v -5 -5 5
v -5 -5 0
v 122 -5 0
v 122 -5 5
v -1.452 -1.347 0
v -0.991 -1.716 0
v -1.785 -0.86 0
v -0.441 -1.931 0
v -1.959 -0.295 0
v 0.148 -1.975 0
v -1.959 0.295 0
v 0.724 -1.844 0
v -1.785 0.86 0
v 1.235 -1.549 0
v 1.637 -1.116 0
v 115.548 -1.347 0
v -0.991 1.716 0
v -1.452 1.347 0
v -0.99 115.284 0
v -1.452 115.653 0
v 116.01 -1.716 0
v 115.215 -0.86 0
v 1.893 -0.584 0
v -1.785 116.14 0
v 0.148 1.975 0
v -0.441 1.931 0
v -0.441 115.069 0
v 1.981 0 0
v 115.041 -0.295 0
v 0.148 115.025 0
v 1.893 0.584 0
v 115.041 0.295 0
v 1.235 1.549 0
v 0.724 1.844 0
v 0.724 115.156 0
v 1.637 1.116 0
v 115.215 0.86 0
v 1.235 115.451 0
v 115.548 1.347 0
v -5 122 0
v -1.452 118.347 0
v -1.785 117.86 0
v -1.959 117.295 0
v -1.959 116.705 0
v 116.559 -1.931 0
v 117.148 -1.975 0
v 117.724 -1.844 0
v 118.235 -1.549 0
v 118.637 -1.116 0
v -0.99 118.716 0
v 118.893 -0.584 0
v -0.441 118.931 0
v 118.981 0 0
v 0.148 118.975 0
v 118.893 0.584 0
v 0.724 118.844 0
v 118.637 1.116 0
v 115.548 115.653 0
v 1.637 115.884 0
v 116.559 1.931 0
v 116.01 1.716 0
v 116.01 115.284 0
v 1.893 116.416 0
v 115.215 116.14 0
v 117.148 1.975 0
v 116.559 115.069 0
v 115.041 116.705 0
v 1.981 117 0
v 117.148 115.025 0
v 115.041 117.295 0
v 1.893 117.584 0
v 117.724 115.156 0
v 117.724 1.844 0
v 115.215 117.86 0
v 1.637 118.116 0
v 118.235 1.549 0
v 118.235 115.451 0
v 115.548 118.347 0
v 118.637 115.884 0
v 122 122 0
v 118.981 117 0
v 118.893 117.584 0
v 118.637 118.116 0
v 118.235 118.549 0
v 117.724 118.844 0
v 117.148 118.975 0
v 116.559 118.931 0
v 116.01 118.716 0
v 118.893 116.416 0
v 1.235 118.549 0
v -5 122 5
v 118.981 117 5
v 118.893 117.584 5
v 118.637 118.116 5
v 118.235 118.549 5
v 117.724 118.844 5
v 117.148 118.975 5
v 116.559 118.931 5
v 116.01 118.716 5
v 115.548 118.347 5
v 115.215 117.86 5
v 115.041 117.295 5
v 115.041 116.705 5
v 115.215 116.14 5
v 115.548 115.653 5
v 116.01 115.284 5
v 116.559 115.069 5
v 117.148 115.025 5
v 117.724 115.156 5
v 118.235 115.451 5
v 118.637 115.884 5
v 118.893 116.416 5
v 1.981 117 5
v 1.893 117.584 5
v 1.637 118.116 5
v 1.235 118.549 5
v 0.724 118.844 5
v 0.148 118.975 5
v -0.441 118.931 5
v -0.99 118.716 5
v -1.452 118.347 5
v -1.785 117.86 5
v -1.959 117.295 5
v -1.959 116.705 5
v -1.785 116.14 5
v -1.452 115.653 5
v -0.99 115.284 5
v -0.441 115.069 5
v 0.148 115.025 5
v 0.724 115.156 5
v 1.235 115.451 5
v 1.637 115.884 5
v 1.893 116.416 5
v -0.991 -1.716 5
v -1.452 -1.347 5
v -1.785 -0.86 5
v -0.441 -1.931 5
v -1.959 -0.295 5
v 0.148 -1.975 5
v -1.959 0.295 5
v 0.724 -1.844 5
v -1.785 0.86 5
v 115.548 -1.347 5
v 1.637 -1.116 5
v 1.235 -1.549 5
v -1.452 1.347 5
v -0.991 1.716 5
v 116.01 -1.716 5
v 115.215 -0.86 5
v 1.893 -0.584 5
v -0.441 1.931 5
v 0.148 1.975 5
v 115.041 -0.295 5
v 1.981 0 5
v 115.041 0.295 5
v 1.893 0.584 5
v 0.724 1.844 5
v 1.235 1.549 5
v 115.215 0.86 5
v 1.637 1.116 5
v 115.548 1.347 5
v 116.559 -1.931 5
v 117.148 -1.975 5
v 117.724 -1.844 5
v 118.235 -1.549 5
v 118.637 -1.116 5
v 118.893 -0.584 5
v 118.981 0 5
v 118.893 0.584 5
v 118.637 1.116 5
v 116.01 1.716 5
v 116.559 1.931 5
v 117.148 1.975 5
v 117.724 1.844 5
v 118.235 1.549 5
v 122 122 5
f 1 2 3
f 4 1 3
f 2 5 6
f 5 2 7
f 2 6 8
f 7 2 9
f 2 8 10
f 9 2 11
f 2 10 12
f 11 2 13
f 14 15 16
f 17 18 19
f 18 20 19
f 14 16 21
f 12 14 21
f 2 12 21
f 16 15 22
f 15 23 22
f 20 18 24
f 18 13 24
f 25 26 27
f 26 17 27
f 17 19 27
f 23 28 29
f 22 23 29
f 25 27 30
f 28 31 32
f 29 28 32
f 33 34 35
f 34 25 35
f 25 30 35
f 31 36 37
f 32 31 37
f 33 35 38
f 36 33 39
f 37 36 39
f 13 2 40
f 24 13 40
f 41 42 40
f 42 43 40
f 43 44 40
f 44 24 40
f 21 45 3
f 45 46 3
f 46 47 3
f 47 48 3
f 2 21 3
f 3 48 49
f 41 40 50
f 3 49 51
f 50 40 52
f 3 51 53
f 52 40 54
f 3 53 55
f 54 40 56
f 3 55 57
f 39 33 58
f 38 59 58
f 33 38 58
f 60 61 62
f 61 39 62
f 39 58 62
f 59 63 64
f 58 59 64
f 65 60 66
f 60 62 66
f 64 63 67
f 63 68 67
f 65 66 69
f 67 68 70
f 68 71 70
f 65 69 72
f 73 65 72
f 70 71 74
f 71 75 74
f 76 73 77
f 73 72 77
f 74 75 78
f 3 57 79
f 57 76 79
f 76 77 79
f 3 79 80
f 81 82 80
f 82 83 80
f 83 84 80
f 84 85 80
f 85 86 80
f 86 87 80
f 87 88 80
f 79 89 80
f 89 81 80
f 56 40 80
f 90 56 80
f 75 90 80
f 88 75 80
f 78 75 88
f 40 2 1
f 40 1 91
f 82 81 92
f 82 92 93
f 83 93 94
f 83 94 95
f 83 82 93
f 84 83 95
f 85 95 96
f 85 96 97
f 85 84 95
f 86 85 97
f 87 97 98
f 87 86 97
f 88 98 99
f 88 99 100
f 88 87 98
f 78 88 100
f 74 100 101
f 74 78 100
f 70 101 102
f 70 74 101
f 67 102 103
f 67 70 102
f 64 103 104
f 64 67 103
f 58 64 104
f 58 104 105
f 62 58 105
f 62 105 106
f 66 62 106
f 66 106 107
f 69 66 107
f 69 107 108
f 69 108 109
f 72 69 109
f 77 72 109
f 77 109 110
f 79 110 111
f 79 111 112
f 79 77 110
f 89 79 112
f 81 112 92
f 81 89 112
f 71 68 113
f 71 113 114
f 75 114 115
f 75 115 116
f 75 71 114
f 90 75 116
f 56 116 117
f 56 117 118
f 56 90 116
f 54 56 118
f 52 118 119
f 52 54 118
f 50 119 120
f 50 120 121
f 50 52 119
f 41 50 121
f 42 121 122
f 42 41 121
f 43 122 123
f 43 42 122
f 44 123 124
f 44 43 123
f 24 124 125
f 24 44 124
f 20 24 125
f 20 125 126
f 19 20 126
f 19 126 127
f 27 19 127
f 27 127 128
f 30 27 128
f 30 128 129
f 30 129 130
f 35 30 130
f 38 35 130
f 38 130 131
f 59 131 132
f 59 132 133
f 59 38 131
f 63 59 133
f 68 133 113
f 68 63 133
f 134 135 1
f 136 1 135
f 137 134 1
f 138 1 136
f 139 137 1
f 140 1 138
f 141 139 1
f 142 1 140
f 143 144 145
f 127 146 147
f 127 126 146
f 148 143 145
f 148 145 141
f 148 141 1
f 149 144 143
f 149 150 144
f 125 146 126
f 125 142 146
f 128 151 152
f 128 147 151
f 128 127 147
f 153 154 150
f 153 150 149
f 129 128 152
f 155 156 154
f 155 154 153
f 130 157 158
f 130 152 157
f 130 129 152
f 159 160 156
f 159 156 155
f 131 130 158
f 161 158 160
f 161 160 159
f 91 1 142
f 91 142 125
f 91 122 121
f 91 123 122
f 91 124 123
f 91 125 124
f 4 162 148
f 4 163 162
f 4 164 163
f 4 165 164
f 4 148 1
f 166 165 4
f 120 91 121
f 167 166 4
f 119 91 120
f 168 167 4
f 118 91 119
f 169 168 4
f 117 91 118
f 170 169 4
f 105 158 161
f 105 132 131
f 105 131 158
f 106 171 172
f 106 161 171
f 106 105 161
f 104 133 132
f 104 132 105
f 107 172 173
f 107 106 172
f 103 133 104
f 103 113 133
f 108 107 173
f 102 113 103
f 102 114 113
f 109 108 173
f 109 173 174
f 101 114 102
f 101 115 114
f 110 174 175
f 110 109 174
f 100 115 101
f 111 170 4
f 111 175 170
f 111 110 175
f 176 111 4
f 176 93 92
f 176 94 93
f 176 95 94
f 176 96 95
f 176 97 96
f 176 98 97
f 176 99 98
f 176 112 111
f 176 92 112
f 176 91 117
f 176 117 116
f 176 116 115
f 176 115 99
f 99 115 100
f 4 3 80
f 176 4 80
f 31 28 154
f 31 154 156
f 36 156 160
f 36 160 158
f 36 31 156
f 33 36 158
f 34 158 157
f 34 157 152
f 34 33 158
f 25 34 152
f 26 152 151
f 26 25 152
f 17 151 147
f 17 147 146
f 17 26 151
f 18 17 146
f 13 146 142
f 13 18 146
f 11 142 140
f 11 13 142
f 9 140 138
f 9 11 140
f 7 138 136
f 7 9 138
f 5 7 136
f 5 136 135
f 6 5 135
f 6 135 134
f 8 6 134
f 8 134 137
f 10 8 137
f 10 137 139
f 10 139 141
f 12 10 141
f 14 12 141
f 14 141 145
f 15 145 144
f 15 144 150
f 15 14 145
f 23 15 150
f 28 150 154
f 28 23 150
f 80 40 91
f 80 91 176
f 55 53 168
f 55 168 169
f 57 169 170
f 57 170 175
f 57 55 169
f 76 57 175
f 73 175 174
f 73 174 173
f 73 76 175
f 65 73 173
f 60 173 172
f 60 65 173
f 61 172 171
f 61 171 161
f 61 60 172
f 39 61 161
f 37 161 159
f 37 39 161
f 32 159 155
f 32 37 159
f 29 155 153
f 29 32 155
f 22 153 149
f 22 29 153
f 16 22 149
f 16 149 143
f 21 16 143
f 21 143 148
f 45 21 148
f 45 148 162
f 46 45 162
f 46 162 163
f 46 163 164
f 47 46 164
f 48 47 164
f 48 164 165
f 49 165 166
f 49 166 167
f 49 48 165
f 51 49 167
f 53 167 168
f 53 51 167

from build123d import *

# Parameters (mm, degrees)
SKETCH_2_W      = 127
SKETCH_2_H      = 127
EXTRUDE_1_DEPTH = 5


with BuildPart() as part:
    # Эскиз2 → Бобышка-Вытянуть1 (new body)
    with BuildSketch(Plane.XY):
        with Locations((58.5, 58.5)):
            Rectangle(SKETCH_2_W, SKETCH_2_H)
        with BuildLine():
            ThreePointArc((-1.981, 0), (0, -1.981), (1.981, 0))
            ThreePointArc((1.981, 0), (0, 1.981), (-1.981, 0))
        make_face(mode=Mode.SUBTRACT)
        with BuildLine():
            ThreePointArc((115.019, 0), (117, -1.981), (118.981, 0))
            ThreePointArc((118.981, 0), (117, 1.981), (115.019, 0))
        make_face(mode=Mode.SUBTRACT)
        with BuildLine():
            ThreePointArc((115.019, 117), (117, 115.019), (118.981, 117))
            ThreePointArc((118.981, 117), (117, 118.981), (115.019, 117))
        make_face(mode=Mode.SUBTRACT)
        with BuildLine():
            ThreePointArc((-1.981, 117), (0, 115.019), (1.981, 117))
            ThreePointArc((1.981, 117), (0, 118.981), (-1.981, 117))
        make_face(mode=Mode.SUBTRACT)
    extrude(amount=EXTRUDE_1_DEPTH)


solid = part.part
